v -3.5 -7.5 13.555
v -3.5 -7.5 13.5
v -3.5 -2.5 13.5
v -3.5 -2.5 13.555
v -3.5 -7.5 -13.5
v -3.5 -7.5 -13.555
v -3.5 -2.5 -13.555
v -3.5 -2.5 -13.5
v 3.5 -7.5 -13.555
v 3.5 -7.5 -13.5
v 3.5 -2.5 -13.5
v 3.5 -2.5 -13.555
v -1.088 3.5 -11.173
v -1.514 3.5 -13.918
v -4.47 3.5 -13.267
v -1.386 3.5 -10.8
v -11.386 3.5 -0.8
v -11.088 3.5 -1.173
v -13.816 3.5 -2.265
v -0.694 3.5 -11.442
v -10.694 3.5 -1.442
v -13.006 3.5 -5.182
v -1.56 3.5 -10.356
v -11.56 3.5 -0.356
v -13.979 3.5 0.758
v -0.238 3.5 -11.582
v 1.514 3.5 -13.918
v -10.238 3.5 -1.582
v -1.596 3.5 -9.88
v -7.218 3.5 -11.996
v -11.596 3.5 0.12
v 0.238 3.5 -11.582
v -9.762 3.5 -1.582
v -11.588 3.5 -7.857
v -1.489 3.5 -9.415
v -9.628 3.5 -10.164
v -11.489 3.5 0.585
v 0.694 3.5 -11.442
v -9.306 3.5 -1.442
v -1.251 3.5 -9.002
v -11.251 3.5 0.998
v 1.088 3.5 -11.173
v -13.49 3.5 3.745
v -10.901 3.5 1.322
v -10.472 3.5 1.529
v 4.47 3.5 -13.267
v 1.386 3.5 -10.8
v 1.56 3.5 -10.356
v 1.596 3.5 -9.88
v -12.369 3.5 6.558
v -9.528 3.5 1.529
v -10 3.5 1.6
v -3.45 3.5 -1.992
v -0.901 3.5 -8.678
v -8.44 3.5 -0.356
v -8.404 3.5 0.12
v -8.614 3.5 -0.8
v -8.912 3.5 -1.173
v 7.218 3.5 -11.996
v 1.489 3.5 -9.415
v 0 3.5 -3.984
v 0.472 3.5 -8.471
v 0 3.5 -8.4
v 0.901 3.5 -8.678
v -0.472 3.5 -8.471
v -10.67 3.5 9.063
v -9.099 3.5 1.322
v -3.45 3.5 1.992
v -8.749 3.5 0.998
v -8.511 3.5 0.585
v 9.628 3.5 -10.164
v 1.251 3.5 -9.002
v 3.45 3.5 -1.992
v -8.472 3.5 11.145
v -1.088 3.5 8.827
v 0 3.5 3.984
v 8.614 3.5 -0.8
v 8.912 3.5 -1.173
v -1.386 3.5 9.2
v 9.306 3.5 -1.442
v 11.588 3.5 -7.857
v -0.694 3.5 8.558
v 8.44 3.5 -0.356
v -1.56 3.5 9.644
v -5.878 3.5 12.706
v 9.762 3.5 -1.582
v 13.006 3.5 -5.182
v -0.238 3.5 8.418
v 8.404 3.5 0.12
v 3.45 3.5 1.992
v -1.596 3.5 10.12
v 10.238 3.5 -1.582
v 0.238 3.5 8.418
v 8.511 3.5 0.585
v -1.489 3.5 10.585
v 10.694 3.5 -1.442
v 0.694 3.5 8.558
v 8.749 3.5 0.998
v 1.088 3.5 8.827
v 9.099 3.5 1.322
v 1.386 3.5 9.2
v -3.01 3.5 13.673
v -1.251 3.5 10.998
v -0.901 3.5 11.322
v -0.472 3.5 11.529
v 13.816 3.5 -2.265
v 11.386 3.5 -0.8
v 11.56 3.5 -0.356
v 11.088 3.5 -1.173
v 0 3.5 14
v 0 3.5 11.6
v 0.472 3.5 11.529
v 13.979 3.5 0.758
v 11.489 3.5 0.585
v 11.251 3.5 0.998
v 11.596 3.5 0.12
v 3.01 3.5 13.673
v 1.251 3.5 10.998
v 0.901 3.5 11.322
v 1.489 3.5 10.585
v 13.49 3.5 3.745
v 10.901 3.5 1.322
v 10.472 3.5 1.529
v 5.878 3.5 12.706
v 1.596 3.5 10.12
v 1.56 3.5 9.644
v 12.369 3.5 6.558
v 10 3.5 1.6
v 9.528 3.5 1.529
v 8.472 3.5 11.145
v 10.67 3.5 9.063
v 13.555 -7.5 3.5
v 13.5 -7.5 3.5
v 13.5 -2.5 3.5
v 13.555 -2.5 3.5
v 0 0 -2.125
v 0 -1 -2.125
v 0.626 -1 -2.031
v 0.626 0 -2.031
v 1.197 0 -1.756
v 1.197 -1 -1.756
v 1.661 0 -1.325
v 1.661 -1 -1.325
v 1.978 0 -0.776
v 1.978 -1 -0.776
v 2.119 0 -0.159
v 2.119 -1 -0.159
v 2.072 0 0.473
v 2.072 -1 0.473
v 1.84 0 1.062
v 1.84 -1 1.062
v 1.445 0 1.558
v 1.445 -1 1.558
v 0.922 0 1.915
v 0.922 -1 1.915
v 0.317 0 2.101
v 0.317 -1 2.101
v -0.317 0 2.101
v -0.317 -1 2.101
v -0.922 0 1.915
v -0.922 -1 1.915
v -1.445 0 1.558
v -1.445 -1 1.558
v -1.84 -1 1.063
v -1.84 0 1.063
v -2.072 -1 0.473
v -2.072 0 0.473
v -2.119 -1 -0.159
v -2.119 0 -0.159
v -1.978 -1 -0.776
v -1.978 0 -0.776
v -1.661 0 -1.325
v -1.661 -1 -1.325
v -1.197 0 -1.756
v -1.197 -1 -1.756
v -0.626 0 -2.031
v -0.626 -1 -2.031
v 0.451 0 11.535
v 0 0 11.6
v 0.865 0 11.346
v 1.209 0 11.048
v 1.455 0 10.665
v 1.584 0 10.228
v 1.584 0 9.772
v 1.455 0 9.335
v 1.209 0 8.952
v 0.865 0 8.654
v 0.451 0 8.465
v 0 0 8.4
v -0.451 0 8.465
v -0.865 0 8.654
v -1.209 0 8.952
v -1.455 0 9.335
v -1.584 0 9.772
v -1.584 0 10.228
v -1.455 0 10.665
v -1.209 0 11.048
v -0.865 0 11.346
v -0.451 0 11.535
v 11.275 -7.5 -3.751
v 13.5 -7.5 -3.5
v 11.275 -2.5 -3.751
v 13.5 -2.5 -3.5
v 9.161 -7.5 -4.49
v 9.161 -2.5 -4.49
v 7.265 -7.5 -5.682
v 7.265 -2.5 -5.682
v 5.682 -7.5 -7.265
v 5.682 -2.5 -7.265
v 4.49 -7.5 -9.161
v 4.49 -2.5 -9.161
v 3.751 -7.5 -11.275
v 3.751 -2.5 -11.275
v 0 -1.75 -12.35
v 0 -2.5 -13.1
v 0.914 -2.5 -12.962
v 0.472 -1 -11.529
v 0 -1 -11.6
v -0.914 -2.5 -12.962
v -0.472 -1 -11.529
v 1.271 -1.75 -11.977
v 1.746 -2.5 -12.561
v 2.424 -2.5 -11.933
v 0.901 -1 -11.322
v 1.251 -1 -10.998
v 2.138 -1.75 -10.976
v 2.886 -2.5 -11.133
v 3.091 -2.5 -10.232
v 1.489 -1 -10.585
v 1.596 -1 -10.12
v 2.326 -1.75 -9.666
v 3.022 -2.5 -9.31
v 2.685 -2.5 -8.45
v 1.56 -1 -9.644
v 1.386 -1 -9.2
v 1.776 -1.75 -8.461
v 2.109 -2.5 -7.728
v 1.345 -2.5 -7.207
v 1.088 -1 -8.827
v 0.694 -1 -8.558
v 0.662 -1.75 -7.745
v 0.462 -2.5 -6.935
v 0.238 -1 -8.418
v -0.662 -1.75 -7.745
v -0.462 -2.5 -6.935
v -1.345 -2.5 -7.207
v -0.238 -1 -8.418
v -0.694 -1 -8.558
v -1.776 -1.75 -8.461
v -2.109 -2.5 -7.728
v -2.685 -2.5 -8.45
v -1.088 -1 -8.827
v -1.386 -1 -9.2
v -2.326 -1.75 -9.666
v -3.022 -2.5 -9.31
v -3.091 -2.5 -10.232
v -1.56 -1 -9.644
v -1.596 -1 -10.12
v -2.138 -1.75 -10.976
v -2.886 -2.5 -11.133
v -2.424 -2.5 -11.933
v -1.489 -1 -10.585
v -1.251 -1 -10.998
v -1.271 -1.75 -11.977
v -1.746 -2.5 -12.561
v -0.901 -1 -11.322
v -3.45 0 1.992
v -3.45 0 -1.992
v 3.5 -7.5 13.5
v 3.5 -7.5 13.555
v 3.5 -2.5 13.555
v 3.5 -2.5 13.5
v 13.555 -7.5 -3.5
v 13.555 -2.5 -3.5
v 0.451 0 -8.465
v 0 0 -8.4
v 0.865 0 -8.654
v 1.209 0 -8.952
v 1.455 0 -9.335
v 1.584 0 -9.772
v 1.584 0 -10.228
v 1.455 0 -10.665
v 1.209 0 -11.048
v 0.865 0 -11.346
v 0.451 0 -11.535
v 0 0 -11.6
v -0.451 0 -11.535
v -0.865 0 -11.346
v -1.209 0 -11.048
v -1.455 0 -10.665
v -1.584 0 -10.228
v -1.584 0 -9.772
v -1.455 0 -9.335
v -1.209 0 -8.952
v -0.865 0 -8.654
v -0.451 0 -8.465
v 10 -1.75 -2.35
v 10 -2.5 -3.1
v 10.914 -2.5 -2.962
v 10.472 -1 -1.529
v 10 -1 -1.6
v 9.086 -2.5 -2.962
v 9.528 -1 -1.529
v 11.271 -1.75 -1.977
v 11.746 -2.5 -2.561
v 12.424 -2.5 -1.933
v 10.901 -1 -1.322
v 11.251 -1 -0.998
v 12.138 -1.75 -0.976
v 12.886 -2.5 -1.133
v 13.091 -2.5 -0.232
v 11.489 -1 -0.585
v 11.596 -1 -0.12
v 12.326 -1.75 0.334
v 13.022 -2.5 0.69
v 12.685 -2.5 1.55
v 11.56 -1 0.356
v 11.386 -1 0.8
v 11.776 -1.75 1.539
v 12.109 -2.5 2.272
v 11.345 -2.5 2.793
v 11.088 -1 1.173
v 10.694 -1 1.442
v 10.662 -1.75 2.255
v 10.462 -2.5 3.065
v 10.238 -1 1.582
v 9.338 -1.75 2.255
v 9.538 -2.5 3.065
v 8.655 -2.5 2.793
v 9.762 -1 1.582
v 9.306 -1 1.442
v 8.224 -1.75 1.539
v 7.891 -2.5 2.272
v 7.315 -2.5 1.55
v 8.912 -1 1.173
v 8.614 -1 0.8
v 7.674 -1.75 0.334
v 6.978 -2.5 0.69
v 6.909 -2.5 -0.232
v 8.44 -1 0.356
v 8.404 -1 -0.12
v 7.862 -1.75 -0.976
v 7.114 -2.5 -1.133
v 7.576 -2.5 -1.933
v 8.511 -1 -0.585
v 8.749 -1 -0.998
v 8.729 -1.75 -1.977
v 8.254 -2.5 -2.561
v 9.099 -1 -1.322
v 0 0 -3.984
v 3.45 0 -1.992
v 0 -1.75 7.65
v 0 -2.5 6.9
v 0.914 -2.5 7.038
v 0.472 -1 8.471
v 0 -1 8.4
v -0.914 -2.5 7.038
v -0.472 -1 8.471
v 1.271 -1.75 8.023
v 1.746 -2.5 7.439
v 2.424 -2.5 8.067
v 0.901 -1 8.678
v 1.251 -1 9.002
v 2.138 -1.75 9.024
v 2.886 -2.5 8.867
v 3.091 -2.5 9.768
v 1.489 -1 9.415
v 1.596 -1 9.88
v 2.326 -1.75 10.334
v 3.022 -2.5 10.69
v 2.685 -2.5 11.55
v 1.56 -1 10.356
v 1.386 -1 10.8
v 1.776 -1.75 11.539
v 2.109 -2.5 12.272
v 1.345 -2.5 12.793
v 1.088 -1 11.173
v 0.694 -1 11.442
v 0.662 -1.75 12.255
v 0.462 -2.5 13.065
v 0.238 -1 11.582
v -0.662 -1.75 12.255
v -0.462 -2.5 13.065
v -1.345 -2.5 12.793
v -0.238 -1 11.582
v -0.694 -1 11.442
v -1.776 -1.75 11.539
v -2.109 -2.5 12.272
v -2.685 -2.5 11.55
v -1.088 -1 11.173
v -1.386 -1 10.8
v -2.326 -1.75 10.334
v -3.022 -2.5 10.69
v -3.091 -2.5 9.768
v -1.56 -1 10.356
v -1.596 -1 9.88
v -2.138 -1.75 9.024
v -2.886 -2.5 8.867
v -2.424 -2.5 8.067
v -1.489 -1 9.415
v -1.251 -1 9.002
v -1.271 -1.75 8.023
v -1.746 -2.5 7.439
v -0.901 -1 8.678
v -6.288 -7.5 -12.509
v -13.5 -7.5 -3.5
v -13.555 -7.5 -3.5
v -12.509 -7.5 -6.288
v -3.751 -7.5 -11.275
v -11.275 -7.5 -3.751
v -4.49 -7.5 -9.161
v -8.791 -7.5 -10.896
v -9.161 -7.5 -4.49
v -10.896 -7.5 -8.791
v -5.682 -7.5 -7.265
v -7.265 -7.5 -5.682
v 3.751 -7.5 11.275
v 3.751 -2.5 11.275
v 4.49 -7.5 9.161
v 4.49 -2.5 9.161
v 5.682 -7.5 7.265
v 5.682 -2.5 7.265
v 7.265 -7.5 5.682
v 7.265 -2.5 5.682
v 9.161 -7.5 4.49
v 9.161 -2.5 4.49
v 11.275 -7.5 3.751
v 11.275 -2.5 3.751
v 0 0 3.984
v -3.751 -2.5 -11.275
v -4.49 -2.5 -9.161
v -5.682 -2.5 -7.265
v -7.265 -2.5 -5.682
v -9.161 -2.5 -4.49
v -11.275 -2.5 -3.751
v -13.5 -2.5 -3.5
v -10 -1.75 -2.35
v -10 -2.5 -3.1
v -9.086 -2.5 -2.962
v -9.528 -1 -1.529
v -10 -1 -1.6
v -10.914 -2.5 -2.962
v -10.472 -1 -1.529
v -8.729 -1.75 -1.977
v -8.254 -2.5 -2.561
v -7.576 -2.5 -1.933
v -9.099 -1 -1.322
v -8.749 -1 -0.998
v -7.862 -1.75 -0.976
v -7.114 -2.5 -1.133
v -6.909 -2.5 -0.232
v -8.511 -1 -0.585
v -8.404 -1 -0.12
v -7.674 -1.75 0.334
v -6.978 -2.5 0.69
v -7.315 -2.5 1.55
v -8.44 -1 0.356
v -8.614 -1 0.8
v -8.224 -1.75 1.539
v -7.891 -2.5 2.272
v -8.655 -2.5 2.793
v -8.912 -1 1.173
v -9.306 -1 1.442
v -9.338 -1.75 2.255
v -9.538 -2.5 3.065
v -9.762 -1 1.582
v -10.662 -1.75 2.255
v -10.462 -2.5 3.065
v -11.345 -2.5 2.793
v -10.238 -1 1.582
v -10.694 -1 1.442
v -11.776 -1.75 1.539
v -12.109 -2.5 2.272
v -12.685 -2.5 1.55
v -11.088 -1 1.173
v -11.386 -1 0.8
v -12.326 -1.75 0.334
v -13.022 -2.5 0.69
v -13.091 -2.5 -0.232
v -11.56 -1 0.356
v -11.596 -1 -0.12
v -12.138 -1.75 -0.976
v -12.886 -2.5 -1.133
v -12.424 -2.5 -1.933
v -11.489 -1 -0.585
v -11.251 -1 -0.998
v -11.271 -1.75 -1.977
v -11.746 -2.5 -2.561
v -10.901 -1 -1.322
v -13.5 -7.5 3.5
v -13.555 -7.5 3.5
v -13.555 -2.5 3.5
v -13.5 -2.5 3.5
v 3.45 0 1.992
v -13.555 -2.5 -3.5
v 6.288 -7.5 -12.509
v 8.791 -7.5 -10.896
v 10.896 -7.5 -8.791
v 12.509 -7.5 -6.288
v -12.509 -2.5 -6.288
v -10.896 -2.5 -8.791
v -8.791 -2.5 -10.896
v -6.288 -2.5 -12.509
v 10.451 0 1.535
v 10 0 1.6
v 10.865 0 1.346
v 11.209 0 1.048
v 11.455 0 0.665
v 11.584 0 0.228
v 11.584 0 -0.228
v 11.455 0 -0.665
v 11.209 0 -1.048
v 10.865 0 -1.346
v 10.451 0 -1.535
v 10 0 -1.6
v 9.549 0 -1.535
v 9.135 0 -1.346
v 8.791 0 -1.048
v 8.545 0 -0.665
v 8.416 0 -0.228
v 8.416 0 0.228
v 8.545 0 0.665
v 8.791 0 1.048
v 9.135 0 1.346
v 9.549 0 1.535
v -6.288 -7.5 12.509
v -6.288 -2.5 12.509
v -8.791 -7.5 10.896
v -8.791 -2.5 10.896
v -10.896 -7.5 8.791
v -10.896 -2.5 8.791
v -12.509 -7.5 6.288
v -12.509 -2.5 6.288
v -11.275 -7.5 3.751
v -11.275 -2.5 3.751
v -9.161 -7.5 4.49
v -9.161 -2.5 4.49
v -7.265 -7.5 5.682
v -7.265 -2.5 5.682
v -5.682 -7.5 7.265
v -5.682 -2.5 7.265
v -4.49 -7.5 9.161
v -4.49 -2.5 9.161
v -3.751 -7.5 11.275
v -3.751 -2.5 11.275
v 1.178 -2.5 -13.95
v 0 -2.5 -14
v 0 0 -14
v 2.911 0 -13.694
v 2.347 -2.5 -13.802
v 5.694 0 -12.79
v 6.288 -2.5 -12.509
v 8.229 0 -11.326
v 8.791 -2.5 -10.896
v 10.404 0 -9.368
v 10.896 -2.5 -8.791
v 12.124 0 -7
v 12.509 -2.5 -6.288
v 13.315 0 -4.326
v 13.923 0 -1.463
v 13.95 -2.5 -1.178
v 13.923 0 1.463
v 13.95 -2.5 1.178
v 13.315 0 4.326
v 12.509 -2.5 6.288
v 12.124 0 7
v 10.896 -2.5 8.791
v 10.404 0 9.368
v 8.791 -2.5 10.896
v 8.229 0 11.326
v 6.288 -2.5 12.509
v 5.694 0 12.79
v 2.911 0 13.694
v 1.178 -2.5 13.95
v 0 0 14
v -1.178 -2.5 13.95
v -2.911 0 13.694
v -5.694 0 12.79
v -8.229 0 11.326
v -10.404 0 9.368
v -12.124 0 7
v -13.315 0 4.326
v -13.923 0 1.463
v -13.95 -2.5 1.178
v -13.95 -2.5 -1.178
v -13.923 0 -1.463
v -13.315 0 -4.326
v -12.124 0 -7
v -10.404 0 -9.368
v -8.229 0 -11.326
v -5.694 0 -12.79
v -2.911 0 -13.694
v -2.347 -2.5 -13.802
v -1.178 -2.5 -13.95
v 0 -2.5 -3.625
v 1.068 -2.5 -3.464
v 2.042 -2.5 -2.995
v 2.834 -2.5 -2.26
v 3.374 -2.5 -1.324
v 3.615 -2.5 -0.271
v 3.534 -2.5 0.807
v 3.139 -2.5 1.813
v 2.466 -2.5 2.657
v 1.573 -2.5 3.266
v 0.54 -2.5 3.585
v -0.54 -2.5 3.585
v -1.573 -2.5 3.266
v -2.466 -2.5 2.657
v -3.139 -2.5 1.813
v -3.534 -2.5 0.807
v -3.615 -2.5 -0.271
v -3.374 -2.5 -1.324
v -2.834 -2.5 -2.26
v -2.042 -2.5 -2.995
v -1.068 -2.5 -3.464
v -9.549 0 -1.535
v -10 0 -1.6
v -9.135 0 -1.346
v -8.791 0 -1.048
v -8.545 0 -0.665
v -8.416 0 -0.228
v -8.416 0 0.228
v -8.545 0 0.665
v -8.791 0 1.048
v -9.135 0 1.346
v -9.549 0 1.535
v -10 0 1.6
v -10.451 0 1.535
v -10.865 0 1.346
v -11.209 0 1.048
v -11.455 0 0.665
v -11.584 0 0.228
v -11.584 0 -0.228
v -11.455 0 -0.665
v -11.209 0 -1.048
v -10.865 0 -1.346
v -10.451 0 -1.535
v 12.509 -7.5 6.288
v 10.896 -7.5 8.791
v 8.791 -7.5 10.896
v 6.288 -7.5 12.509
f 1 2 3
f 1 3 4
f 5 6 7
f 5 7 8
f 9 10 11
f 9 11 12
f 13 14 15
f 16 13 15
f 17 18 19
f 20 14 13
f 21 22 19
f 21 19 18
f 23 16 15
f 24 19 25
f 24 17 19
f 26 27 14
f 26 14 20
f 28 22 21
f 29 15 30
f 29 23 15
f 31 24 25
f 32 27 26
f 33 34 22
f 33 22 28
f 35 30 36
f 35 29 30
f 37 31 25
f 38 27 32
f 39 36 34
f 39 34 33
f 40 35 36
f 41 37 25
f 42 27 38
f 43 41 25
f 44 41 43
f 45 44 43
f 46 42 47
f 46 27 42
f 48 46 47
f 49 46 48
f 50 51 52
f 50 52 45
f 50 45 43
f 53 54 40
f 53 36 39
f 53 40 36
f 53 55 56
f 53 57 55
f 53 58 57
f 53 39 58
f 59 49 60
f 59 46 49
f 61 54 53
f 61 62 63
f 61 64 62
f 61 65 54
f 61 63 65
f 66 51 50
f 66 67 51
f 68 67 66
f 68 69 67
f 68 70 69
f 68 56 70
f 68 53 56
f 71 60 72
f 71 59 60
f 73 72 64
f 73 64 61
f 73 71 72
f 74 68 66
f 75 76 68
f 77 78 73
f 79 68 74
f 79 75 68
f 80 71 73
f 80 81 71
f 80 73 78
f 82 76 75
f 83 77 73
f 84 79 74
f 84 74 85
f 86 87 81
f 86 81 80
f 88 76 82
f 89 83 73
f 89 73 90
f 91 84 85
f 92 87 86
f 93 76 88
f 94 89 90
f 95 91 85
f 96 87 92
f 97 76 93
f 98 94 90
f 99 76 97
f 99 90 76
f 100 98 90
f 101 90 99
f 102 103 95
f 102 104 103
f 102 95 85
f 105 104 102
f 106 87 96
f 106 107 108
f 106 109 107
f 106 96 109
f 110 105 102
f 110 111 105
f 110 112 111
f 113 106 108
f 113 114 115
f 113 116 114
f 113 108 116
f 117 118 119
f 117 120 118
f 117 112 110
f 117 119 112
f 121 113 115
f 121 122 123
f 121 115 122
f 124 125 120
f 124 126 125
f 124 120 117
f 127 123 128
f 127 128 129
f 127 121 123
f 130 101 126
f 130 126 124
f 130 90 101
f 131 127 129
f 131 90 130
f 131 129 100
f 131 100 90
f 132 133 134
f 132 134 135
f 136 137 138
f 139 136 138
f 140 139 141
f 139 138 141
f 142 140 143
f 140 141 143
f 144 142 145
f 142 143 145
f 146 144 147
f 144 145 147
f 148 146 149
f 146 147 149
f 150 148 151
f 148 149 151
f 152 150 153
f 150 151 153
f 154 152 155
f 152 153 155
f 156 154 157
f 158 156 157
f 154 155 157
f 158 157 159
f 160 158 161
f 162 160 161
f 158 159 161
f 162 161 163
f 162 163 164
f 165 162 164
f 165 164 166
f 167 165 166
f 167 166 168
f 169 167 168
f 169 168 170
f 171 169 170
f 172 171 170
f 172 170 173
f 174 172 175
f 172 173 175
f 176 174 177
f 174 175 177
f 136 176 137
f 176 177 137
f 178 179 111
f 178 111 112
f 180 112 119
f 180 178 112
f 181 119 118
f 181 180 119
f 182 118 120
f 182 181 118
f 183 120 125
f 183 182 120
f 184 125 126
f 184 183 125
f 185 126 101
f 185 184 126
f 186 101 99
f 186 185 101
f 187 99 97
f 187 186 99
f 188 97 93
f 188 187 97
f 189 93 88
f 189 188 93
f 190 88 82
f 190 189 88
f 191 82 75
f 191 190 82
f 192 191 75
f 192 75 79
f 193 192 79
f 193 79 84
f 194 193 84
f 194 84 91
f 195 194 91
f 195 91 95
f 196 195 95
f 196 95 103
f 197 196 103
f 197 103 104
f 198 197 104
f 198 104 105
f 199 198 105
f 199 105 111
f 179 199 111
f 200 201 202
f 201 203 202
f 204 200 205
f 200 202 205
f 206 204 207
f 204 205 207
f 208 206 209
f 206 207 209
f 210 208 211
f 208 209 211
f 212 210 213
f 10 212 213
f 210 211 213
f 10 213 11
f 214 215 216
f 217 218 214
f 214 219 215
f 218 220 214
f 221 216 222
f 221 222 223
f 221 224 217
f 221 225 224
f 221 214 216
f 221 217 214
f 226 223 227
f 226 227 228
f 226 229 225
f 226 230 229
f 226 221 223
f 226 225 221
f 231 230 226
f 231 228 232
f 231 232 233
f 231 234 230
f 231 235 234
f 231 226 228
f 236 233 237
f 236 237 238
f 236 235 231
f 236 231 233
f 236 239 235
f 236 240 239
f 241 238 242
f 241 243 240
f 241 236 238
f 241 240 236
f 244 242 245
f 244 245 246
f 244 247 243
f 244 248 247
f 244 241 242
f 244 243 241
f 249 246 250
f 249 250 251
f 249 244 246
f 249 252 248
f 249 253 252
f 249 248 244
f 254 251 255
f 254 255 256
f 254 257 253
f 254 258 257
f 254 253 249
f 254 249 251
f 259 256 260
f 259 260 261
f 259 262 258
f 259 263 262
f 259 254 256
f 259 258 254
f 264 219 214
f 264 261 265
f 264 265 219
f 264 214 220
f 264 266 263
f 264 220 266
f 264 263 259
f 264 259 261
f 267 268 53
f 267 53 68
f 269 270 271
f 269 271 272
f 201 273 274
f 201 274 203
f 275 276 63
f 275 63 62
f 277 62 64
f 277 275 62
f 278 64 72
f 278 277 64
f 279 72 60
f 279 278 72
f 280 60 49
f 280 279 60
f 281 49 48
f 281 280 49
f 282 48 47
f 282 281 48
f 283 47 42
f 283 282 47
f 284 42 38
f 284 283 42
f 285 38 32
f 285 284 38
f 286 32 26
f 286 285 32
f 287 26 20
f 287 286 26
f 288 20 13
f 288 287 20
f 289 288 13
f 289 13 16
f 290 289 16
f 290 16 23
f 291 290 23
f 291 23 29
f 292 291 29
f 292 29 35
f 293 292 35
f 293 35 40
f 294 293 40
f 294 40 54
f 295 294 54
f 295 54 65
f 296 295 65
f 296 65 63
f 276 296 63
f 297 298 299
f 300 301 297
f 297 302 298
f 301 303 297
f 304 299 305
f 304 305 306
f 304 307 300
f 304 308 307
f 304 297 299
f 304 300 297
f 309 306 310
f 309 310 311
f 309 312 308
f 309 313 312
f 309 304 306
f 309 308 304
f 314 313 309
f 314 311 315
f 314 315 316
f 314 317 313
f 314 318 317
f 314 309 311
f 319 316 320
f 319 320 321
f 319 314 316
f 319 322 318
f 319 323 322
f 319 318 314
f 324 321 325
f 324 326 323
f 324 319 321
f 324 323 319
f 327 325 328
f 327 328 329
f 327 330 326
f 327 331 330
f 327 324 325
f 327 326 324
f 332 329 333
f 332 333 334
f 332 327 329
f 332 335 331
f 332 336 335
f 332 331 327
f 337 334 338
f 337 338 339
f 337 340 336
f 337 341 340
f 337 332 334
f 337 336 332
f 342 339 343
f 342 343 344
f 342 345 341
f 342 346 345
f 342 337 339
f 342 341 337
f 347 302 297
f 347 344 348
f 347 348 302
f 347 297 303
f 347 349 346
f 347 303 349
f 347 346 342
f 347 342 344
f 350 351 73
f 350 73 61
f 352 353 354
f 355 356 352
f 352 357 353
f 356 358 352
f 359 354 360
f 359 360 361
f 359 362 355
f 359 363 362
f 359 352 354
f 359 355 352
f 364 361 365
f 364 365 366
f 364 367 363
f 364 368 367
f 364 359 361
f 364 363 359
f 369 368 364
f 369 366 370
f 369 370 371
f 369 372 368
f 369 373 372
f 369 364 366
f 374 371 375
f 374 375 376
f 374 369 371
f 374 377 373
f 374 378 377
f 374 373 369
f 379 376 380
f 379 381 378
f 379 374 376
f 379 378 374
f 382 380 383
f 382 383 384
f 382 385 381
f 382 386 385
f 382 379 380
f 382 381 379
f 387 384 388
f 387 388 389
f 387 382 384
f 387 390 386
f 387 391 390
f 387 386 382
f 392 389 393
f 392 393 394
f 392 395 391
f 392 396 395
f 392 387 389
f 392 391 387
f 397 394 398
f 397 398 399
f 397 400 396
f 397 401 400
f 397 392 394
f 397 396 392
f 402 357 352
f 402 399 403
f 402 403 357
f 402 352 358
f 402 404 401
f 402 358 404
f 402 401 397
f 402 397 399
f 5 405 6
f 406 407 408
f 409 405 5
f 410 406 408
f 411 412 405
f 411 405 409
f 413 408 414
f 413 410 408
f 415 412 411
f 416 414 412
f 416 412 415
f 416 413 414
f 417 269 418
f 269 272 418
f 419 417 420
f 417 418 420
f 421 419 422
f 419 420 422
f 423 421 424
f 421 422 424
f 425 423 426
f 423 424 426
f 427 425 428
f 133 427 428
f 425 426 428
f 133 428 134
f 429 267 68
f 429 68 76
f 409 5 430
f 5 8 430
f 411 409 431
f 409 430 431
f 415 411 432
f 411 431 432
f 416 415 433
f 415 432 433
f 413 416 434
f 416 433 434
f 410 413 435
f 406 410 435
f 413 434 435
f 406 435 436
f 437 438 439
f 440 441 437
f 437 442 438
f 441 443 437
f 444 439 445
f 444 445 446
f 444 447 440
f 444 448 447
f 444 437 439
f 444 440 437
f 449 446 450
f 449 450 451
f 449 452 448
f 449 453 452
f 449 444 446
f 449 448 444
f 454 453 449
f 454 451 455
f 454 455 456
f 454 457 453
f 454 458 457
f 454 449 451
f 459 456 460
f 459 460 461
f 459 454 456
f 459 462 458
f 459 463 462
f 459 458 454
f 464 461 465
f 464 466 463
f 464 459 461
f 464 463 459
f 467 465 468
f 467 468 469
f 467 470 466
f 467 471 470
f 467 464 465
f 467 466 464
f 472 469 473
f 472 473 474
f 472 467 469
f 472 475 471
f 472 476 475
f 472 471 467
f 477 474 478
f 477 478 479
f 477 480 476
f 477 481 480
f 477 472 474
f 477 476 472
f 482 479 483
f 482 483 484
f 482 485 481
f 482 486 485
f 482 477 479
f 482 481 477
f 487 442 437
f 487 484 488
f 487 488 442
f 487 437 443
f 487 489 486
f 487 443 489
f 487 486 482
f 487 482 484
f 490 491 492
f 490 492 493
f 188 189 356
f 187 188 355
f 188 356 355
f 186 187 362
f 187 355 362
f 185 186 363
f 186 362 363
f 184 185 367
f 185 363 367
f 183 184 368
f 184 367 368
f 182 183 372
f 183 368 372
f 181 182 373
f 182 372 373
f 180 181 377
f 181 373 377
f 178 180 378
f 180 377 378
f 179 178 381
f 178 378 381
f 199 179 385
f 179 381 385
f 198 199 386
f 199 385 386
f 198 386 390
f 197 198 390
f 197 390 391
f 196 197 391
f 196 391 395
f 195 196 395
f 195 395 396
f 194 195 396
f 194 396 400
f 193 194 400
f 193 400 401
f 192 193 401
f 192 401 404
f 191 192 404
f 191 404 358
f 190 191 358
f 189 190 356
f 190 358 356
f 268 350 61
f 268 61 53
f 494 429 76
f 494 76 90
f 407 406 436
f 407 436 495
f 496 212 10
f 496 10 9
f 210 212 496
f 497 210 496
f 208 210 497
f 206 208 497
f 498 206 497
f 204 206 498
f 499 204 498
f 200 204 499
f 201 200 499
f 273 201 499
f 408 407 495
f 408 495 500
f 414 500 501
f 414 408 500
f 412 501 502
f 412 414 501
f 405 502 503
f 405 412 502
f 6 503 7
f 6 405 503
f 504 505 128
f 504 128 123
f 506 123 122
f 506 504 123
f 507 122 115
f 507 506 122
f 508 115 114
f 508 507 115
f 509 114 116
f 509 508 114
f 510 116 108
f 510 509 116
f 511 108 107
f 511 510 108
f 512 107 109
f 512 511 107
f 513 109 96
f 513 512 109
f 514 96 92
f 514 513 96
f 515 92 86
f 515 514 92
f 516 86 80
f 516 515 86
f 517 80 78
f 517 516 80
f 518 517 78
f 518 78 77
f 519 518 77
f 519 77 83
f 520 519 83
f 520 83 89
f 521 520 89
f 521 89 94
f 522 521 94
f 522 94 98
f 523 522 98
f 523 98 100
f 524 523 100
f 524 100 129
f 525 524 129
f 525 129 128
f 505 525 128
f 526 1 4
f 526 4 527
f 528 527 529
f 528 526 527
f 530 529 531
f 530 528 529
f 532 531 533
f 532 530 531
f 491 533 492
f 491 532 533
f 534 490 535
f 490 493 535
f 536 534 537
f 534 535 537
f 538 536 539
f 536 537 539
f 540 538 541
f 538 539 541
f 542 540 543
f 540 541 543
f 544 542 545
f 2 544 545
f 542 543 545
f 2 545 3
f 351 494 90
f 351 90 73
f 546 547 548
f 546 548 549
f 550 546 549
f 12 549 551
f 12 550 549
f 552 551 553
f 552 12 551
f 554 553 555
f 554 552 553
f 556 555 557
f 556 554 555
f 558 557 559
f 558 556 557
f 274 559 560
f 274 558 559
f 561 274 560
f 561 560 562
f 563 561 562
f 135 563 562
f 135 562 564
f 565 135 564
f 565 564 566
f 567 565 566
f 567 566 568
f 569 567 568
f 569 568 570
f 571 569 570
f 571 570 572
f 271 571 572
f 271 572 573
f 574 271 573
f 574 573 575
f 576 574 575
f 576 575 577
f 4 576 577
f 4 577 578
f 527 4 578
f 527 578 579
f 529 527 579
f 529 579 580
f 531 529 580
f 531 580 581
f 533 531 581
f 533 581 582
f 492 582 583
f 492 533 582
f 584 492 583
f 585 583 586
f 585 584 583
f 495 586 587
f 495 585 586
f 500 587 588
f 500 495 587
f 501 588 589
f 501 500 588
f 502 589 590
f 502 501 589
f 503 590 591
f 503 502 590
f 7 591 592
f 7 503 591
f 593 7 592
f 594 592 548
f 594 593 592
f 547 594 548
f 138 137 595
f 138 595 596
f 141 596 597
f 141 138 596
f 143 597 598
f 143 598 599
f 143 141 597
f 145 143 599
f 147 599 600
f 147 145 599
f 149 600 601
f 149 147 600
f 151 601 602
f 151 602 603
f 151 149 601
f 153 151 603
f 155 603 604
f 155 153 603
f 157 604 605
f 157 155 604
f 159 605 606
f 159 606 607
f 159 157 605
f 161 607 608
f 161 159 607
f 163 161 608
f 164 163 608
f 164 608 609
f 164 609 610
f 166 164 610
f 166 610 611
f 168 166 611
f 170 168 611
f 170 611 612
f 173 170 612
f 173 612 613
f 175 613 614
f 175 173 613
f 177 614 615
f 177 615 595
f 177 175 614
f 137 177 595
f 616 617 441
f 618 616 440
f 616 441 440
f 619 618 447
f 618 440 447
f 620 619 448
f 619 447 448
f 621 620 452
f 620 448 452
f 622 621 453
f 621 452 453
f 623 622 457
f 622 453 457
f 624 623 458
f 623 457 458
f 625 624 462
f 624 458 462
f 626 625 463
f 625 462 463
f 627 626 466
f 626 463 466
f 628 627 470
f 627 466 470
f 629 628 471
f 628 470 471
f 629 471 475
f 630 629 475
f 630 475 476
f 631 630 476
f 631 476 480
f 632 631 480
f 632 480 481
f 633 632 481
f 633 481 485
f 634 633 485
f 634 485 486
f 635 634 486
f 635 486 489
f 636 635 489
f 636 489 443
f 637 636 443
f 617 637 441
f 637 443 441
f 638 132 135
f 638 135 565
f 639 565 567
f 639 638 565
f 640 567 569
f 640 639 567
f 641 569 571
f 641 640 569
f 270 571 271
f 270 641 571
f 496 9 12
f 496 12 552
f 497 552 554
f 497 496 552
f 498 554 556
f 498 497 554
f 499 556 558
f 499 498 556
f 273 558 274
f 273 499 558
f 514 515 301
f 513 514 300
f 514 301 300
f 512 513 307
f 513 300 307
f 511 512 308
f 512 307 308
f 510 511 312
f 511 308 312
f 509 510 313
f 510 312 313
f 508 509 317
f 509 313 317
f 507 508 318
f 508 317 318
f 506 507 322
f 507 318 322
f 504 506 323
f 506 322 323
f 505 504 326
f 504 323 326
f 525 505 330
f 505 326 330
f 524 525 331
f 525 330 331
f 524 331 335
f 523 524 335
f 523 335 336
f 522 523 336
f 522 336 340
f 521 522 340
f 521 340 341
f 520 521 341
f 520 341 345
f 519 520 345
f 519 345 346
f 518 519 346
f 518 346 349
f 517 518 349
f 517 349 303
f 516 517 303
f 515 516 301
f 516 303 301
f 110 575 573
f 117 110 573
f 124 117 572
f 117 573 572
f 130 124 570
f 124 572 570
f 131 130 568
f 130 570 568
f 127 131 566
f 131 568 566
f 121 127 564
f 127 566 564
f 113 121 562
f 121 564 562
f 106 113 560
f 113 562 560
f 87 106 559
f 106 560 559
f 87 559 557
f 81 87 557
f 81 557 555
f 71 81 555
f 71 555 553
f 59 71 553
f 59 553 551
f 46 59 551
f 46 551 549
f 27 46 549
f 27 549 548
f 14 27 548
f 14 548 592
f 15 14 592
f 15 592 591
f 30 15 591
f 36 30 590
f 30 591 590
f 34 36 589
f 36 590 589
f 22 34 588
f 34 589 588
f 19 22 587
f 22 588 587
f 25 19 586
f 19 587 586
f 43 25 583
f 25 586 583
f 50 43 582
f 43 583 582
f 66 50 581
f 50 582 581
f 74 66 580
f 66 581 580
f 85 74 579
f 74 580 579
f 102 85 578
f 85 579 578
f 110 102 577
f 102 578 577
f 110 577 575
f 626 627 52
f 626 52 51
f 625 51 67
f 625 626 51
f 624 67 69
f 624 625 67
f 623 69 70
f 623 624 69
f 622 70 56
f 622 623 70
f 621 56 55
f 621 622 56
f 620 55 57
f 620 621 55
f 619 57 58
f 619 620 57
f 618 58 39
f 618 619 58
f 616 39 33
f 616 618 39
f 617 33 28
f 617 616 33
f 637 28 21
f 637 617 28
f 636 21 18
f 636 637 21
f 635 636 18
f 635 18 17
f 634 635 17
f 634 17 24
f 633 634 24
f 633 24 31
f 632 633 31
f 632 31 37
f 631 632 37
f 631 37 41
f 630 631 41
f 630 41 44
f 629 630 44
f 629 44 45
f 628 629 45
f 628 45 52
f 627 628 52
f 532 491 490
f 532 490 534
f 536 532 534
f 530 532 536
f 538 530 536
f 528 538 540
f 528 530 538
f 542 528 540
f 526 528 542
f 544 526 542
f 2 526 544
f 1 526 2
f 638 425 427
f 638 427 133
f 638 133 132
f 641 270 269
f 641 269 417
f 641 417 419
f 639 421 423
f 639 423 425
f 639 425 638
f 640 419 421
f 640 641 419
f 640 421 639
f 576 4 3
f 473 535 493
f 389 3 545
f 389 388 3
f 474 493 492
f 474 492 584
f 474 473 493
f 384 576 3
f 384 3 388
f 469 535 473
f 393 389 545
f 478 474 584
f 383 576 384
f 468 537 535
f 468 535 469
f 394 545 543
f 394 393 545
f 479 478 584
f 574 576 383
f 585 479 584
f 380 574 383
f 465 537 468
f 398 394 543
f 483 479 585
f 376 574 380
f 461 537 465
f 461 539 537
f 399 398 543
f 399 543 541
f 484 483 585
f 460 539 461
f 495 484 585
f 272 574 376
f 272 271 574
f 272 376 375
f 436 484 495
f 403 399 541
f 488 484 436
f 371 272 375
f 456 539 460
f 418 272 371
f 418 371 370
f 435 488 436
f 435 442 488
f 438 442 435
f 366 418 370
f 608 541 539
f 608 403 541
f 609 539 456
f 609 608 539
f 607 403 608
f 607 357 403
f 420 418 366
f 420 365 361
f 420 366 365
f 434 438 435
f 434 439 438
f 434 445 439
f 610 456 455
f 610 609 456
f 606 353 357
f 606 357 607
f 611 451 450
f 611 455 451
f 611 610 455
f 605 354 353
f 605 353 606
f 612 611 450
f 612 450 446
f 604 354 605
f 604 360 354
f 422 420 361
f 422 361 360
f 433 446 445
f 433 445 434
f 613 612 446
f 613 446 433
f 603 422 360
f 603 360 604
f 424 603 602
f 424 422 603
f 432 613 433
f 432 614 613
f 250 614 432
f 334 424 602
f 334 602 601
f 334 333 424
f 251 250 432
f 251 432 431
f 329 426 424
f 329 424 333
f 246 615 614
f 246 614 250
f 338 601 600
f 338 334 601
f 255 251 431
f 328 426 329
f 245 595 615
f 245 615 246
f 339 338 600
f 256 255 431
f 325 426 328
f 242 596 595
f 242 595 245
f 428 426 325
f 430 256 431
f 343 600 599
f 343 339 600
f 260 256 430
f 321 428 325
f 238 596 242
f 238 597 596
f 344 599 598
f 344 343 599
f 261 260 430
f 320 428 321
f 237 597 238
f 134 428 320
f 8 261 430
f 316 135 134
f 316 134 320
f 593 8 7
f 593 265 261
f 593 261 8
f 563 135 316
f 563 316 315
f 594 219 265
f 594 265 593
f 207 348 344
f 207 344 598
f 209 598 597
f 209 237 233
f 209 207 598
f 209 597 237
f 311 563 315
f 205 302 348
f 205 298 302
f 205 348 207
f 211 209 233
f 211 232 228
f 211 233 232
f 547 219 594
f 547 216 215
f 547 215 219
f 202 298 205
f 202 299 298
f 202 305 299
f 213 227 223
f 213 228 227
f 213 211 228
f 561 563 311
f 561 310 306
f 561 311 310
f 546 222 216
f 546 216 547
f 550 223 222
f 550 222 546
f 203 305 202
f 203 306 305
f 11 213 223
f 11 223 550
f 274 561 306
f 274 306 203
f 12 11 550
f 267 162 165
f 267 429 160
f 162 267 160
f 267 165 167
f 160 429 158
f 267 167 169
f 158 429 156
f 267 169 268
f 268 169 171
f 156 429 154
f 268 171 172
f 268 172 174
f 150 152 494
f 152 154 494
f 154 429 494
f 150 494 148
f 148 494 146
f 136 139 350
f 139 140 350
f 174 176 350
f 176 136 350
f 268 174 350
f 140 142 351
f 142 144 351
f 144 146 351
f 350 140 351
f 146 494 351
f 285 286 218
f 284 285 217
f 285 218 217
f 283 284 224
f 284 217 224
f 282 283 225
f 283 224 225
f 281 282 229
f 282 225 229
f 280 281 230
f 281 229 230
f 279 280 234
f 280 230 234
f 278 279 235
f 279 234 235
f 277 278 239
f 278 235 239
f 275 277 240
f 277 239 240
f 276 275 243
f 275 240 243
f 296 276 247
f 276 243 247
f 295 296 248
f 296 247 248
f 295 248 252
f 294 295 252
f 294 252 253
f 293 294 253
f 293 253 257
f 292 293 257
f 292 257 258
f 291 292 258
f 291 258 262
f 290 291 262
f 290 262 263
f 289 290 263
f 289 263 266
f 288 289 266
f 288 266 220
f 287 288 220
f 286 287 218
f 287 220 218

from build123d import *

# Parameters (mm, degrees)
SKETCH1_R           = 14
SKETCH1_R_2         = 1.6
BOSS_EXTRUDE1_DEPTH = 3.5
BOSS_EXTRUDE2_START = 2.5
SKETCH2_R           = 14
SKETCH2_R_2         = 2.125
SKETCH2_R_3         = 1.6
BOSS_EXTRUDE2_DEPTH = 2.5
CHAMFER1_SIZE       = 1.5
BOSS_EXTRUDE3_START = 5
BOSS_EXTRUDE3_DEPTH = 5
FILLET1_R           = 10


with BuildPart() as part:
    # Sketch1 → Boss-Extrude1 (new body)
    with BuildSketch(Plane(origin=(0, 0, 0), x_dir=(1, 0, 0), z_dir=(0, 1, 0))):
        with Locations(Location((0, 0, 0), (0, 0, 270))):
            Circle(SKETCH1_R)
        with Locations(Location((0, 10, 0), (0, 0, 270))):
            Circle(SKETCH1_R_2, mode=Mode.SUBTRACT)
        with Locations(Location((10, 0, 0), (0, 0, 270))):
            Circle(SKETCH1_R_2, mode=Mode.SUBTRACT)
        with Locations(Location((0, -10, 0), (0, 0, 270))):
            Circle(SKETCH1_R_2, mode=Mode.SUBTRACT)
        with Locations(Location((-10, 0, 0), (0, 0, 270))):
            Circle(SKETCH1_R_2, mode=Mode.SUBTRACT)
        Polygon((0, 3.983716857), (-3.45, 1.991858429), (-3.45, -1.991858429), (0, -3.983716857), (3.45, -1.991858429), (3.45, 1.991858429), align=None, mode=Mode.SUBTRACT)
    extrude(amount=BOSS_EXTRUDE1_DEPTH)

    # Sketch2 → Boss-Extrude2 (add)
    with BuildSketch(Plane.XZ.offset(BOSS_EXTRUDE2_START)):
        with Locations(Location((0, 0, 0), (0, 0, 270))):
            Circle(SKETCH2_R)
        with Locations(Location((0, 0, 0), (0, 0, 270))):
            Circle(SKETCH2_R_2, mode=Mode.SUBTRACT)
        with Locations(Location((10, 0, 0), (0, 0, 270))):
            Circle(SKETCH2_R_3, mode=Mode.SUBTRACT)
        with Locations(Location((0, -10, 0), (0, 0, 270))):
            Circle(SKETCH2_R_3, mode=Mode.SUBTRACT)
        with Locations(Location((-10, 0, 0), (0, 0, 270))):
            Circle(SKETCH2_R_3, mode=Mode.SUBTRACT)
        with Locations(Location((0, 10, 0), (0, 0, 270))):
            Circle(SKETCH2_R_3, mode=Mode.SUBTRACT)
    extrude(amount=-BOSS_EXTRUDE2_DEPTH)

    # Chamfer1
    chamfer1_edges = [part.edges().sort_by_distance(p)[0] for p in [
        (0, -2.5, 2.125),
        (10, -2.5, 1.6),
        (0, -2.5, -8.4),
        (-10, -2.5, 1.6),
        (0, -2.5, 11.6),
    ]]
    chamfer(chamfer1_edges, length=CHAMFER1_SIZE)

    # Sketch3 → Boss-Extrude3 (add)
    with BuildSketch(Plane.XZ.offset(2.5).offset(BOSS_EXTRUDE3_START)):
        with BuildLine():
            ThreePointArc((-3.5, 13.555441712), (-9.899494937, 9.899494937), (-13.555441712, 3.5))
            Line((-13.555441712, 3.5), (-4, 3.5))
            Line((-4, 3.5), (-3.5, 3.5))
            Line((-3.5, 3.5), (-3.5, 4))
            Line((-3.5, 4), (-3.5, 13.555441712))
        make_face()
        with BuildLine():
            Line((4, 3.5), (13.555441712, 3.5))
            ThreePointArc((13.555441712, 3.5), (9.899494937, 9.899494937), (3.5, 13.555441712))
            Line((3.5, 13.555441712), (3.5, 4))
            Line((3.5, 4), (3.5, 3.5))
            Line((3.5, 3.5), (4, 3.5))
        make_face()
        with BuildLine():
            Line((13.555441712, -3.5), (4, -3.5))
            Line((4, -3.5), (3.5, -3.5))
            Line((3.5, -3.5), (3.5, -4))
            Line((3.5, -4), (3.5, -13.555441712))
            ThreePointArc((3.5, -13.555441712), (9.899494937, -9.899494937), (13.555441712, -3.5))
        make_face()
        with BuildLine():
            ThreePointArc((-13.555441712, -3.5), (-9.899494937, -9.899494937), (-3.5, -13.555441712))
            Line((-3.5, -13.555441712), (-3.5, -4))
            Line((-3.5, -4), (-3.5, -3.5))
            Line((-3.5, -3.5), (-4, -3.5))
            Line((-4, -3.5), (-13.555441712, -3.5))
        make_face()
    extrude(amount=-BOSS_EXTRUDE3_DEPTH)

    # Fillet1
    fillet1_edges = [part.edges().sort_by_distance(p)[0] for p in [
        (-3.5, -5, 3.5),
        (-3.5, -5, -3.5),
        (3.5, -5, -3.5),
        (3.5, -5, 3.5),
    ]]
    fillet(fillet1_edges, radius=FILLET1_R)


solid = part.part
